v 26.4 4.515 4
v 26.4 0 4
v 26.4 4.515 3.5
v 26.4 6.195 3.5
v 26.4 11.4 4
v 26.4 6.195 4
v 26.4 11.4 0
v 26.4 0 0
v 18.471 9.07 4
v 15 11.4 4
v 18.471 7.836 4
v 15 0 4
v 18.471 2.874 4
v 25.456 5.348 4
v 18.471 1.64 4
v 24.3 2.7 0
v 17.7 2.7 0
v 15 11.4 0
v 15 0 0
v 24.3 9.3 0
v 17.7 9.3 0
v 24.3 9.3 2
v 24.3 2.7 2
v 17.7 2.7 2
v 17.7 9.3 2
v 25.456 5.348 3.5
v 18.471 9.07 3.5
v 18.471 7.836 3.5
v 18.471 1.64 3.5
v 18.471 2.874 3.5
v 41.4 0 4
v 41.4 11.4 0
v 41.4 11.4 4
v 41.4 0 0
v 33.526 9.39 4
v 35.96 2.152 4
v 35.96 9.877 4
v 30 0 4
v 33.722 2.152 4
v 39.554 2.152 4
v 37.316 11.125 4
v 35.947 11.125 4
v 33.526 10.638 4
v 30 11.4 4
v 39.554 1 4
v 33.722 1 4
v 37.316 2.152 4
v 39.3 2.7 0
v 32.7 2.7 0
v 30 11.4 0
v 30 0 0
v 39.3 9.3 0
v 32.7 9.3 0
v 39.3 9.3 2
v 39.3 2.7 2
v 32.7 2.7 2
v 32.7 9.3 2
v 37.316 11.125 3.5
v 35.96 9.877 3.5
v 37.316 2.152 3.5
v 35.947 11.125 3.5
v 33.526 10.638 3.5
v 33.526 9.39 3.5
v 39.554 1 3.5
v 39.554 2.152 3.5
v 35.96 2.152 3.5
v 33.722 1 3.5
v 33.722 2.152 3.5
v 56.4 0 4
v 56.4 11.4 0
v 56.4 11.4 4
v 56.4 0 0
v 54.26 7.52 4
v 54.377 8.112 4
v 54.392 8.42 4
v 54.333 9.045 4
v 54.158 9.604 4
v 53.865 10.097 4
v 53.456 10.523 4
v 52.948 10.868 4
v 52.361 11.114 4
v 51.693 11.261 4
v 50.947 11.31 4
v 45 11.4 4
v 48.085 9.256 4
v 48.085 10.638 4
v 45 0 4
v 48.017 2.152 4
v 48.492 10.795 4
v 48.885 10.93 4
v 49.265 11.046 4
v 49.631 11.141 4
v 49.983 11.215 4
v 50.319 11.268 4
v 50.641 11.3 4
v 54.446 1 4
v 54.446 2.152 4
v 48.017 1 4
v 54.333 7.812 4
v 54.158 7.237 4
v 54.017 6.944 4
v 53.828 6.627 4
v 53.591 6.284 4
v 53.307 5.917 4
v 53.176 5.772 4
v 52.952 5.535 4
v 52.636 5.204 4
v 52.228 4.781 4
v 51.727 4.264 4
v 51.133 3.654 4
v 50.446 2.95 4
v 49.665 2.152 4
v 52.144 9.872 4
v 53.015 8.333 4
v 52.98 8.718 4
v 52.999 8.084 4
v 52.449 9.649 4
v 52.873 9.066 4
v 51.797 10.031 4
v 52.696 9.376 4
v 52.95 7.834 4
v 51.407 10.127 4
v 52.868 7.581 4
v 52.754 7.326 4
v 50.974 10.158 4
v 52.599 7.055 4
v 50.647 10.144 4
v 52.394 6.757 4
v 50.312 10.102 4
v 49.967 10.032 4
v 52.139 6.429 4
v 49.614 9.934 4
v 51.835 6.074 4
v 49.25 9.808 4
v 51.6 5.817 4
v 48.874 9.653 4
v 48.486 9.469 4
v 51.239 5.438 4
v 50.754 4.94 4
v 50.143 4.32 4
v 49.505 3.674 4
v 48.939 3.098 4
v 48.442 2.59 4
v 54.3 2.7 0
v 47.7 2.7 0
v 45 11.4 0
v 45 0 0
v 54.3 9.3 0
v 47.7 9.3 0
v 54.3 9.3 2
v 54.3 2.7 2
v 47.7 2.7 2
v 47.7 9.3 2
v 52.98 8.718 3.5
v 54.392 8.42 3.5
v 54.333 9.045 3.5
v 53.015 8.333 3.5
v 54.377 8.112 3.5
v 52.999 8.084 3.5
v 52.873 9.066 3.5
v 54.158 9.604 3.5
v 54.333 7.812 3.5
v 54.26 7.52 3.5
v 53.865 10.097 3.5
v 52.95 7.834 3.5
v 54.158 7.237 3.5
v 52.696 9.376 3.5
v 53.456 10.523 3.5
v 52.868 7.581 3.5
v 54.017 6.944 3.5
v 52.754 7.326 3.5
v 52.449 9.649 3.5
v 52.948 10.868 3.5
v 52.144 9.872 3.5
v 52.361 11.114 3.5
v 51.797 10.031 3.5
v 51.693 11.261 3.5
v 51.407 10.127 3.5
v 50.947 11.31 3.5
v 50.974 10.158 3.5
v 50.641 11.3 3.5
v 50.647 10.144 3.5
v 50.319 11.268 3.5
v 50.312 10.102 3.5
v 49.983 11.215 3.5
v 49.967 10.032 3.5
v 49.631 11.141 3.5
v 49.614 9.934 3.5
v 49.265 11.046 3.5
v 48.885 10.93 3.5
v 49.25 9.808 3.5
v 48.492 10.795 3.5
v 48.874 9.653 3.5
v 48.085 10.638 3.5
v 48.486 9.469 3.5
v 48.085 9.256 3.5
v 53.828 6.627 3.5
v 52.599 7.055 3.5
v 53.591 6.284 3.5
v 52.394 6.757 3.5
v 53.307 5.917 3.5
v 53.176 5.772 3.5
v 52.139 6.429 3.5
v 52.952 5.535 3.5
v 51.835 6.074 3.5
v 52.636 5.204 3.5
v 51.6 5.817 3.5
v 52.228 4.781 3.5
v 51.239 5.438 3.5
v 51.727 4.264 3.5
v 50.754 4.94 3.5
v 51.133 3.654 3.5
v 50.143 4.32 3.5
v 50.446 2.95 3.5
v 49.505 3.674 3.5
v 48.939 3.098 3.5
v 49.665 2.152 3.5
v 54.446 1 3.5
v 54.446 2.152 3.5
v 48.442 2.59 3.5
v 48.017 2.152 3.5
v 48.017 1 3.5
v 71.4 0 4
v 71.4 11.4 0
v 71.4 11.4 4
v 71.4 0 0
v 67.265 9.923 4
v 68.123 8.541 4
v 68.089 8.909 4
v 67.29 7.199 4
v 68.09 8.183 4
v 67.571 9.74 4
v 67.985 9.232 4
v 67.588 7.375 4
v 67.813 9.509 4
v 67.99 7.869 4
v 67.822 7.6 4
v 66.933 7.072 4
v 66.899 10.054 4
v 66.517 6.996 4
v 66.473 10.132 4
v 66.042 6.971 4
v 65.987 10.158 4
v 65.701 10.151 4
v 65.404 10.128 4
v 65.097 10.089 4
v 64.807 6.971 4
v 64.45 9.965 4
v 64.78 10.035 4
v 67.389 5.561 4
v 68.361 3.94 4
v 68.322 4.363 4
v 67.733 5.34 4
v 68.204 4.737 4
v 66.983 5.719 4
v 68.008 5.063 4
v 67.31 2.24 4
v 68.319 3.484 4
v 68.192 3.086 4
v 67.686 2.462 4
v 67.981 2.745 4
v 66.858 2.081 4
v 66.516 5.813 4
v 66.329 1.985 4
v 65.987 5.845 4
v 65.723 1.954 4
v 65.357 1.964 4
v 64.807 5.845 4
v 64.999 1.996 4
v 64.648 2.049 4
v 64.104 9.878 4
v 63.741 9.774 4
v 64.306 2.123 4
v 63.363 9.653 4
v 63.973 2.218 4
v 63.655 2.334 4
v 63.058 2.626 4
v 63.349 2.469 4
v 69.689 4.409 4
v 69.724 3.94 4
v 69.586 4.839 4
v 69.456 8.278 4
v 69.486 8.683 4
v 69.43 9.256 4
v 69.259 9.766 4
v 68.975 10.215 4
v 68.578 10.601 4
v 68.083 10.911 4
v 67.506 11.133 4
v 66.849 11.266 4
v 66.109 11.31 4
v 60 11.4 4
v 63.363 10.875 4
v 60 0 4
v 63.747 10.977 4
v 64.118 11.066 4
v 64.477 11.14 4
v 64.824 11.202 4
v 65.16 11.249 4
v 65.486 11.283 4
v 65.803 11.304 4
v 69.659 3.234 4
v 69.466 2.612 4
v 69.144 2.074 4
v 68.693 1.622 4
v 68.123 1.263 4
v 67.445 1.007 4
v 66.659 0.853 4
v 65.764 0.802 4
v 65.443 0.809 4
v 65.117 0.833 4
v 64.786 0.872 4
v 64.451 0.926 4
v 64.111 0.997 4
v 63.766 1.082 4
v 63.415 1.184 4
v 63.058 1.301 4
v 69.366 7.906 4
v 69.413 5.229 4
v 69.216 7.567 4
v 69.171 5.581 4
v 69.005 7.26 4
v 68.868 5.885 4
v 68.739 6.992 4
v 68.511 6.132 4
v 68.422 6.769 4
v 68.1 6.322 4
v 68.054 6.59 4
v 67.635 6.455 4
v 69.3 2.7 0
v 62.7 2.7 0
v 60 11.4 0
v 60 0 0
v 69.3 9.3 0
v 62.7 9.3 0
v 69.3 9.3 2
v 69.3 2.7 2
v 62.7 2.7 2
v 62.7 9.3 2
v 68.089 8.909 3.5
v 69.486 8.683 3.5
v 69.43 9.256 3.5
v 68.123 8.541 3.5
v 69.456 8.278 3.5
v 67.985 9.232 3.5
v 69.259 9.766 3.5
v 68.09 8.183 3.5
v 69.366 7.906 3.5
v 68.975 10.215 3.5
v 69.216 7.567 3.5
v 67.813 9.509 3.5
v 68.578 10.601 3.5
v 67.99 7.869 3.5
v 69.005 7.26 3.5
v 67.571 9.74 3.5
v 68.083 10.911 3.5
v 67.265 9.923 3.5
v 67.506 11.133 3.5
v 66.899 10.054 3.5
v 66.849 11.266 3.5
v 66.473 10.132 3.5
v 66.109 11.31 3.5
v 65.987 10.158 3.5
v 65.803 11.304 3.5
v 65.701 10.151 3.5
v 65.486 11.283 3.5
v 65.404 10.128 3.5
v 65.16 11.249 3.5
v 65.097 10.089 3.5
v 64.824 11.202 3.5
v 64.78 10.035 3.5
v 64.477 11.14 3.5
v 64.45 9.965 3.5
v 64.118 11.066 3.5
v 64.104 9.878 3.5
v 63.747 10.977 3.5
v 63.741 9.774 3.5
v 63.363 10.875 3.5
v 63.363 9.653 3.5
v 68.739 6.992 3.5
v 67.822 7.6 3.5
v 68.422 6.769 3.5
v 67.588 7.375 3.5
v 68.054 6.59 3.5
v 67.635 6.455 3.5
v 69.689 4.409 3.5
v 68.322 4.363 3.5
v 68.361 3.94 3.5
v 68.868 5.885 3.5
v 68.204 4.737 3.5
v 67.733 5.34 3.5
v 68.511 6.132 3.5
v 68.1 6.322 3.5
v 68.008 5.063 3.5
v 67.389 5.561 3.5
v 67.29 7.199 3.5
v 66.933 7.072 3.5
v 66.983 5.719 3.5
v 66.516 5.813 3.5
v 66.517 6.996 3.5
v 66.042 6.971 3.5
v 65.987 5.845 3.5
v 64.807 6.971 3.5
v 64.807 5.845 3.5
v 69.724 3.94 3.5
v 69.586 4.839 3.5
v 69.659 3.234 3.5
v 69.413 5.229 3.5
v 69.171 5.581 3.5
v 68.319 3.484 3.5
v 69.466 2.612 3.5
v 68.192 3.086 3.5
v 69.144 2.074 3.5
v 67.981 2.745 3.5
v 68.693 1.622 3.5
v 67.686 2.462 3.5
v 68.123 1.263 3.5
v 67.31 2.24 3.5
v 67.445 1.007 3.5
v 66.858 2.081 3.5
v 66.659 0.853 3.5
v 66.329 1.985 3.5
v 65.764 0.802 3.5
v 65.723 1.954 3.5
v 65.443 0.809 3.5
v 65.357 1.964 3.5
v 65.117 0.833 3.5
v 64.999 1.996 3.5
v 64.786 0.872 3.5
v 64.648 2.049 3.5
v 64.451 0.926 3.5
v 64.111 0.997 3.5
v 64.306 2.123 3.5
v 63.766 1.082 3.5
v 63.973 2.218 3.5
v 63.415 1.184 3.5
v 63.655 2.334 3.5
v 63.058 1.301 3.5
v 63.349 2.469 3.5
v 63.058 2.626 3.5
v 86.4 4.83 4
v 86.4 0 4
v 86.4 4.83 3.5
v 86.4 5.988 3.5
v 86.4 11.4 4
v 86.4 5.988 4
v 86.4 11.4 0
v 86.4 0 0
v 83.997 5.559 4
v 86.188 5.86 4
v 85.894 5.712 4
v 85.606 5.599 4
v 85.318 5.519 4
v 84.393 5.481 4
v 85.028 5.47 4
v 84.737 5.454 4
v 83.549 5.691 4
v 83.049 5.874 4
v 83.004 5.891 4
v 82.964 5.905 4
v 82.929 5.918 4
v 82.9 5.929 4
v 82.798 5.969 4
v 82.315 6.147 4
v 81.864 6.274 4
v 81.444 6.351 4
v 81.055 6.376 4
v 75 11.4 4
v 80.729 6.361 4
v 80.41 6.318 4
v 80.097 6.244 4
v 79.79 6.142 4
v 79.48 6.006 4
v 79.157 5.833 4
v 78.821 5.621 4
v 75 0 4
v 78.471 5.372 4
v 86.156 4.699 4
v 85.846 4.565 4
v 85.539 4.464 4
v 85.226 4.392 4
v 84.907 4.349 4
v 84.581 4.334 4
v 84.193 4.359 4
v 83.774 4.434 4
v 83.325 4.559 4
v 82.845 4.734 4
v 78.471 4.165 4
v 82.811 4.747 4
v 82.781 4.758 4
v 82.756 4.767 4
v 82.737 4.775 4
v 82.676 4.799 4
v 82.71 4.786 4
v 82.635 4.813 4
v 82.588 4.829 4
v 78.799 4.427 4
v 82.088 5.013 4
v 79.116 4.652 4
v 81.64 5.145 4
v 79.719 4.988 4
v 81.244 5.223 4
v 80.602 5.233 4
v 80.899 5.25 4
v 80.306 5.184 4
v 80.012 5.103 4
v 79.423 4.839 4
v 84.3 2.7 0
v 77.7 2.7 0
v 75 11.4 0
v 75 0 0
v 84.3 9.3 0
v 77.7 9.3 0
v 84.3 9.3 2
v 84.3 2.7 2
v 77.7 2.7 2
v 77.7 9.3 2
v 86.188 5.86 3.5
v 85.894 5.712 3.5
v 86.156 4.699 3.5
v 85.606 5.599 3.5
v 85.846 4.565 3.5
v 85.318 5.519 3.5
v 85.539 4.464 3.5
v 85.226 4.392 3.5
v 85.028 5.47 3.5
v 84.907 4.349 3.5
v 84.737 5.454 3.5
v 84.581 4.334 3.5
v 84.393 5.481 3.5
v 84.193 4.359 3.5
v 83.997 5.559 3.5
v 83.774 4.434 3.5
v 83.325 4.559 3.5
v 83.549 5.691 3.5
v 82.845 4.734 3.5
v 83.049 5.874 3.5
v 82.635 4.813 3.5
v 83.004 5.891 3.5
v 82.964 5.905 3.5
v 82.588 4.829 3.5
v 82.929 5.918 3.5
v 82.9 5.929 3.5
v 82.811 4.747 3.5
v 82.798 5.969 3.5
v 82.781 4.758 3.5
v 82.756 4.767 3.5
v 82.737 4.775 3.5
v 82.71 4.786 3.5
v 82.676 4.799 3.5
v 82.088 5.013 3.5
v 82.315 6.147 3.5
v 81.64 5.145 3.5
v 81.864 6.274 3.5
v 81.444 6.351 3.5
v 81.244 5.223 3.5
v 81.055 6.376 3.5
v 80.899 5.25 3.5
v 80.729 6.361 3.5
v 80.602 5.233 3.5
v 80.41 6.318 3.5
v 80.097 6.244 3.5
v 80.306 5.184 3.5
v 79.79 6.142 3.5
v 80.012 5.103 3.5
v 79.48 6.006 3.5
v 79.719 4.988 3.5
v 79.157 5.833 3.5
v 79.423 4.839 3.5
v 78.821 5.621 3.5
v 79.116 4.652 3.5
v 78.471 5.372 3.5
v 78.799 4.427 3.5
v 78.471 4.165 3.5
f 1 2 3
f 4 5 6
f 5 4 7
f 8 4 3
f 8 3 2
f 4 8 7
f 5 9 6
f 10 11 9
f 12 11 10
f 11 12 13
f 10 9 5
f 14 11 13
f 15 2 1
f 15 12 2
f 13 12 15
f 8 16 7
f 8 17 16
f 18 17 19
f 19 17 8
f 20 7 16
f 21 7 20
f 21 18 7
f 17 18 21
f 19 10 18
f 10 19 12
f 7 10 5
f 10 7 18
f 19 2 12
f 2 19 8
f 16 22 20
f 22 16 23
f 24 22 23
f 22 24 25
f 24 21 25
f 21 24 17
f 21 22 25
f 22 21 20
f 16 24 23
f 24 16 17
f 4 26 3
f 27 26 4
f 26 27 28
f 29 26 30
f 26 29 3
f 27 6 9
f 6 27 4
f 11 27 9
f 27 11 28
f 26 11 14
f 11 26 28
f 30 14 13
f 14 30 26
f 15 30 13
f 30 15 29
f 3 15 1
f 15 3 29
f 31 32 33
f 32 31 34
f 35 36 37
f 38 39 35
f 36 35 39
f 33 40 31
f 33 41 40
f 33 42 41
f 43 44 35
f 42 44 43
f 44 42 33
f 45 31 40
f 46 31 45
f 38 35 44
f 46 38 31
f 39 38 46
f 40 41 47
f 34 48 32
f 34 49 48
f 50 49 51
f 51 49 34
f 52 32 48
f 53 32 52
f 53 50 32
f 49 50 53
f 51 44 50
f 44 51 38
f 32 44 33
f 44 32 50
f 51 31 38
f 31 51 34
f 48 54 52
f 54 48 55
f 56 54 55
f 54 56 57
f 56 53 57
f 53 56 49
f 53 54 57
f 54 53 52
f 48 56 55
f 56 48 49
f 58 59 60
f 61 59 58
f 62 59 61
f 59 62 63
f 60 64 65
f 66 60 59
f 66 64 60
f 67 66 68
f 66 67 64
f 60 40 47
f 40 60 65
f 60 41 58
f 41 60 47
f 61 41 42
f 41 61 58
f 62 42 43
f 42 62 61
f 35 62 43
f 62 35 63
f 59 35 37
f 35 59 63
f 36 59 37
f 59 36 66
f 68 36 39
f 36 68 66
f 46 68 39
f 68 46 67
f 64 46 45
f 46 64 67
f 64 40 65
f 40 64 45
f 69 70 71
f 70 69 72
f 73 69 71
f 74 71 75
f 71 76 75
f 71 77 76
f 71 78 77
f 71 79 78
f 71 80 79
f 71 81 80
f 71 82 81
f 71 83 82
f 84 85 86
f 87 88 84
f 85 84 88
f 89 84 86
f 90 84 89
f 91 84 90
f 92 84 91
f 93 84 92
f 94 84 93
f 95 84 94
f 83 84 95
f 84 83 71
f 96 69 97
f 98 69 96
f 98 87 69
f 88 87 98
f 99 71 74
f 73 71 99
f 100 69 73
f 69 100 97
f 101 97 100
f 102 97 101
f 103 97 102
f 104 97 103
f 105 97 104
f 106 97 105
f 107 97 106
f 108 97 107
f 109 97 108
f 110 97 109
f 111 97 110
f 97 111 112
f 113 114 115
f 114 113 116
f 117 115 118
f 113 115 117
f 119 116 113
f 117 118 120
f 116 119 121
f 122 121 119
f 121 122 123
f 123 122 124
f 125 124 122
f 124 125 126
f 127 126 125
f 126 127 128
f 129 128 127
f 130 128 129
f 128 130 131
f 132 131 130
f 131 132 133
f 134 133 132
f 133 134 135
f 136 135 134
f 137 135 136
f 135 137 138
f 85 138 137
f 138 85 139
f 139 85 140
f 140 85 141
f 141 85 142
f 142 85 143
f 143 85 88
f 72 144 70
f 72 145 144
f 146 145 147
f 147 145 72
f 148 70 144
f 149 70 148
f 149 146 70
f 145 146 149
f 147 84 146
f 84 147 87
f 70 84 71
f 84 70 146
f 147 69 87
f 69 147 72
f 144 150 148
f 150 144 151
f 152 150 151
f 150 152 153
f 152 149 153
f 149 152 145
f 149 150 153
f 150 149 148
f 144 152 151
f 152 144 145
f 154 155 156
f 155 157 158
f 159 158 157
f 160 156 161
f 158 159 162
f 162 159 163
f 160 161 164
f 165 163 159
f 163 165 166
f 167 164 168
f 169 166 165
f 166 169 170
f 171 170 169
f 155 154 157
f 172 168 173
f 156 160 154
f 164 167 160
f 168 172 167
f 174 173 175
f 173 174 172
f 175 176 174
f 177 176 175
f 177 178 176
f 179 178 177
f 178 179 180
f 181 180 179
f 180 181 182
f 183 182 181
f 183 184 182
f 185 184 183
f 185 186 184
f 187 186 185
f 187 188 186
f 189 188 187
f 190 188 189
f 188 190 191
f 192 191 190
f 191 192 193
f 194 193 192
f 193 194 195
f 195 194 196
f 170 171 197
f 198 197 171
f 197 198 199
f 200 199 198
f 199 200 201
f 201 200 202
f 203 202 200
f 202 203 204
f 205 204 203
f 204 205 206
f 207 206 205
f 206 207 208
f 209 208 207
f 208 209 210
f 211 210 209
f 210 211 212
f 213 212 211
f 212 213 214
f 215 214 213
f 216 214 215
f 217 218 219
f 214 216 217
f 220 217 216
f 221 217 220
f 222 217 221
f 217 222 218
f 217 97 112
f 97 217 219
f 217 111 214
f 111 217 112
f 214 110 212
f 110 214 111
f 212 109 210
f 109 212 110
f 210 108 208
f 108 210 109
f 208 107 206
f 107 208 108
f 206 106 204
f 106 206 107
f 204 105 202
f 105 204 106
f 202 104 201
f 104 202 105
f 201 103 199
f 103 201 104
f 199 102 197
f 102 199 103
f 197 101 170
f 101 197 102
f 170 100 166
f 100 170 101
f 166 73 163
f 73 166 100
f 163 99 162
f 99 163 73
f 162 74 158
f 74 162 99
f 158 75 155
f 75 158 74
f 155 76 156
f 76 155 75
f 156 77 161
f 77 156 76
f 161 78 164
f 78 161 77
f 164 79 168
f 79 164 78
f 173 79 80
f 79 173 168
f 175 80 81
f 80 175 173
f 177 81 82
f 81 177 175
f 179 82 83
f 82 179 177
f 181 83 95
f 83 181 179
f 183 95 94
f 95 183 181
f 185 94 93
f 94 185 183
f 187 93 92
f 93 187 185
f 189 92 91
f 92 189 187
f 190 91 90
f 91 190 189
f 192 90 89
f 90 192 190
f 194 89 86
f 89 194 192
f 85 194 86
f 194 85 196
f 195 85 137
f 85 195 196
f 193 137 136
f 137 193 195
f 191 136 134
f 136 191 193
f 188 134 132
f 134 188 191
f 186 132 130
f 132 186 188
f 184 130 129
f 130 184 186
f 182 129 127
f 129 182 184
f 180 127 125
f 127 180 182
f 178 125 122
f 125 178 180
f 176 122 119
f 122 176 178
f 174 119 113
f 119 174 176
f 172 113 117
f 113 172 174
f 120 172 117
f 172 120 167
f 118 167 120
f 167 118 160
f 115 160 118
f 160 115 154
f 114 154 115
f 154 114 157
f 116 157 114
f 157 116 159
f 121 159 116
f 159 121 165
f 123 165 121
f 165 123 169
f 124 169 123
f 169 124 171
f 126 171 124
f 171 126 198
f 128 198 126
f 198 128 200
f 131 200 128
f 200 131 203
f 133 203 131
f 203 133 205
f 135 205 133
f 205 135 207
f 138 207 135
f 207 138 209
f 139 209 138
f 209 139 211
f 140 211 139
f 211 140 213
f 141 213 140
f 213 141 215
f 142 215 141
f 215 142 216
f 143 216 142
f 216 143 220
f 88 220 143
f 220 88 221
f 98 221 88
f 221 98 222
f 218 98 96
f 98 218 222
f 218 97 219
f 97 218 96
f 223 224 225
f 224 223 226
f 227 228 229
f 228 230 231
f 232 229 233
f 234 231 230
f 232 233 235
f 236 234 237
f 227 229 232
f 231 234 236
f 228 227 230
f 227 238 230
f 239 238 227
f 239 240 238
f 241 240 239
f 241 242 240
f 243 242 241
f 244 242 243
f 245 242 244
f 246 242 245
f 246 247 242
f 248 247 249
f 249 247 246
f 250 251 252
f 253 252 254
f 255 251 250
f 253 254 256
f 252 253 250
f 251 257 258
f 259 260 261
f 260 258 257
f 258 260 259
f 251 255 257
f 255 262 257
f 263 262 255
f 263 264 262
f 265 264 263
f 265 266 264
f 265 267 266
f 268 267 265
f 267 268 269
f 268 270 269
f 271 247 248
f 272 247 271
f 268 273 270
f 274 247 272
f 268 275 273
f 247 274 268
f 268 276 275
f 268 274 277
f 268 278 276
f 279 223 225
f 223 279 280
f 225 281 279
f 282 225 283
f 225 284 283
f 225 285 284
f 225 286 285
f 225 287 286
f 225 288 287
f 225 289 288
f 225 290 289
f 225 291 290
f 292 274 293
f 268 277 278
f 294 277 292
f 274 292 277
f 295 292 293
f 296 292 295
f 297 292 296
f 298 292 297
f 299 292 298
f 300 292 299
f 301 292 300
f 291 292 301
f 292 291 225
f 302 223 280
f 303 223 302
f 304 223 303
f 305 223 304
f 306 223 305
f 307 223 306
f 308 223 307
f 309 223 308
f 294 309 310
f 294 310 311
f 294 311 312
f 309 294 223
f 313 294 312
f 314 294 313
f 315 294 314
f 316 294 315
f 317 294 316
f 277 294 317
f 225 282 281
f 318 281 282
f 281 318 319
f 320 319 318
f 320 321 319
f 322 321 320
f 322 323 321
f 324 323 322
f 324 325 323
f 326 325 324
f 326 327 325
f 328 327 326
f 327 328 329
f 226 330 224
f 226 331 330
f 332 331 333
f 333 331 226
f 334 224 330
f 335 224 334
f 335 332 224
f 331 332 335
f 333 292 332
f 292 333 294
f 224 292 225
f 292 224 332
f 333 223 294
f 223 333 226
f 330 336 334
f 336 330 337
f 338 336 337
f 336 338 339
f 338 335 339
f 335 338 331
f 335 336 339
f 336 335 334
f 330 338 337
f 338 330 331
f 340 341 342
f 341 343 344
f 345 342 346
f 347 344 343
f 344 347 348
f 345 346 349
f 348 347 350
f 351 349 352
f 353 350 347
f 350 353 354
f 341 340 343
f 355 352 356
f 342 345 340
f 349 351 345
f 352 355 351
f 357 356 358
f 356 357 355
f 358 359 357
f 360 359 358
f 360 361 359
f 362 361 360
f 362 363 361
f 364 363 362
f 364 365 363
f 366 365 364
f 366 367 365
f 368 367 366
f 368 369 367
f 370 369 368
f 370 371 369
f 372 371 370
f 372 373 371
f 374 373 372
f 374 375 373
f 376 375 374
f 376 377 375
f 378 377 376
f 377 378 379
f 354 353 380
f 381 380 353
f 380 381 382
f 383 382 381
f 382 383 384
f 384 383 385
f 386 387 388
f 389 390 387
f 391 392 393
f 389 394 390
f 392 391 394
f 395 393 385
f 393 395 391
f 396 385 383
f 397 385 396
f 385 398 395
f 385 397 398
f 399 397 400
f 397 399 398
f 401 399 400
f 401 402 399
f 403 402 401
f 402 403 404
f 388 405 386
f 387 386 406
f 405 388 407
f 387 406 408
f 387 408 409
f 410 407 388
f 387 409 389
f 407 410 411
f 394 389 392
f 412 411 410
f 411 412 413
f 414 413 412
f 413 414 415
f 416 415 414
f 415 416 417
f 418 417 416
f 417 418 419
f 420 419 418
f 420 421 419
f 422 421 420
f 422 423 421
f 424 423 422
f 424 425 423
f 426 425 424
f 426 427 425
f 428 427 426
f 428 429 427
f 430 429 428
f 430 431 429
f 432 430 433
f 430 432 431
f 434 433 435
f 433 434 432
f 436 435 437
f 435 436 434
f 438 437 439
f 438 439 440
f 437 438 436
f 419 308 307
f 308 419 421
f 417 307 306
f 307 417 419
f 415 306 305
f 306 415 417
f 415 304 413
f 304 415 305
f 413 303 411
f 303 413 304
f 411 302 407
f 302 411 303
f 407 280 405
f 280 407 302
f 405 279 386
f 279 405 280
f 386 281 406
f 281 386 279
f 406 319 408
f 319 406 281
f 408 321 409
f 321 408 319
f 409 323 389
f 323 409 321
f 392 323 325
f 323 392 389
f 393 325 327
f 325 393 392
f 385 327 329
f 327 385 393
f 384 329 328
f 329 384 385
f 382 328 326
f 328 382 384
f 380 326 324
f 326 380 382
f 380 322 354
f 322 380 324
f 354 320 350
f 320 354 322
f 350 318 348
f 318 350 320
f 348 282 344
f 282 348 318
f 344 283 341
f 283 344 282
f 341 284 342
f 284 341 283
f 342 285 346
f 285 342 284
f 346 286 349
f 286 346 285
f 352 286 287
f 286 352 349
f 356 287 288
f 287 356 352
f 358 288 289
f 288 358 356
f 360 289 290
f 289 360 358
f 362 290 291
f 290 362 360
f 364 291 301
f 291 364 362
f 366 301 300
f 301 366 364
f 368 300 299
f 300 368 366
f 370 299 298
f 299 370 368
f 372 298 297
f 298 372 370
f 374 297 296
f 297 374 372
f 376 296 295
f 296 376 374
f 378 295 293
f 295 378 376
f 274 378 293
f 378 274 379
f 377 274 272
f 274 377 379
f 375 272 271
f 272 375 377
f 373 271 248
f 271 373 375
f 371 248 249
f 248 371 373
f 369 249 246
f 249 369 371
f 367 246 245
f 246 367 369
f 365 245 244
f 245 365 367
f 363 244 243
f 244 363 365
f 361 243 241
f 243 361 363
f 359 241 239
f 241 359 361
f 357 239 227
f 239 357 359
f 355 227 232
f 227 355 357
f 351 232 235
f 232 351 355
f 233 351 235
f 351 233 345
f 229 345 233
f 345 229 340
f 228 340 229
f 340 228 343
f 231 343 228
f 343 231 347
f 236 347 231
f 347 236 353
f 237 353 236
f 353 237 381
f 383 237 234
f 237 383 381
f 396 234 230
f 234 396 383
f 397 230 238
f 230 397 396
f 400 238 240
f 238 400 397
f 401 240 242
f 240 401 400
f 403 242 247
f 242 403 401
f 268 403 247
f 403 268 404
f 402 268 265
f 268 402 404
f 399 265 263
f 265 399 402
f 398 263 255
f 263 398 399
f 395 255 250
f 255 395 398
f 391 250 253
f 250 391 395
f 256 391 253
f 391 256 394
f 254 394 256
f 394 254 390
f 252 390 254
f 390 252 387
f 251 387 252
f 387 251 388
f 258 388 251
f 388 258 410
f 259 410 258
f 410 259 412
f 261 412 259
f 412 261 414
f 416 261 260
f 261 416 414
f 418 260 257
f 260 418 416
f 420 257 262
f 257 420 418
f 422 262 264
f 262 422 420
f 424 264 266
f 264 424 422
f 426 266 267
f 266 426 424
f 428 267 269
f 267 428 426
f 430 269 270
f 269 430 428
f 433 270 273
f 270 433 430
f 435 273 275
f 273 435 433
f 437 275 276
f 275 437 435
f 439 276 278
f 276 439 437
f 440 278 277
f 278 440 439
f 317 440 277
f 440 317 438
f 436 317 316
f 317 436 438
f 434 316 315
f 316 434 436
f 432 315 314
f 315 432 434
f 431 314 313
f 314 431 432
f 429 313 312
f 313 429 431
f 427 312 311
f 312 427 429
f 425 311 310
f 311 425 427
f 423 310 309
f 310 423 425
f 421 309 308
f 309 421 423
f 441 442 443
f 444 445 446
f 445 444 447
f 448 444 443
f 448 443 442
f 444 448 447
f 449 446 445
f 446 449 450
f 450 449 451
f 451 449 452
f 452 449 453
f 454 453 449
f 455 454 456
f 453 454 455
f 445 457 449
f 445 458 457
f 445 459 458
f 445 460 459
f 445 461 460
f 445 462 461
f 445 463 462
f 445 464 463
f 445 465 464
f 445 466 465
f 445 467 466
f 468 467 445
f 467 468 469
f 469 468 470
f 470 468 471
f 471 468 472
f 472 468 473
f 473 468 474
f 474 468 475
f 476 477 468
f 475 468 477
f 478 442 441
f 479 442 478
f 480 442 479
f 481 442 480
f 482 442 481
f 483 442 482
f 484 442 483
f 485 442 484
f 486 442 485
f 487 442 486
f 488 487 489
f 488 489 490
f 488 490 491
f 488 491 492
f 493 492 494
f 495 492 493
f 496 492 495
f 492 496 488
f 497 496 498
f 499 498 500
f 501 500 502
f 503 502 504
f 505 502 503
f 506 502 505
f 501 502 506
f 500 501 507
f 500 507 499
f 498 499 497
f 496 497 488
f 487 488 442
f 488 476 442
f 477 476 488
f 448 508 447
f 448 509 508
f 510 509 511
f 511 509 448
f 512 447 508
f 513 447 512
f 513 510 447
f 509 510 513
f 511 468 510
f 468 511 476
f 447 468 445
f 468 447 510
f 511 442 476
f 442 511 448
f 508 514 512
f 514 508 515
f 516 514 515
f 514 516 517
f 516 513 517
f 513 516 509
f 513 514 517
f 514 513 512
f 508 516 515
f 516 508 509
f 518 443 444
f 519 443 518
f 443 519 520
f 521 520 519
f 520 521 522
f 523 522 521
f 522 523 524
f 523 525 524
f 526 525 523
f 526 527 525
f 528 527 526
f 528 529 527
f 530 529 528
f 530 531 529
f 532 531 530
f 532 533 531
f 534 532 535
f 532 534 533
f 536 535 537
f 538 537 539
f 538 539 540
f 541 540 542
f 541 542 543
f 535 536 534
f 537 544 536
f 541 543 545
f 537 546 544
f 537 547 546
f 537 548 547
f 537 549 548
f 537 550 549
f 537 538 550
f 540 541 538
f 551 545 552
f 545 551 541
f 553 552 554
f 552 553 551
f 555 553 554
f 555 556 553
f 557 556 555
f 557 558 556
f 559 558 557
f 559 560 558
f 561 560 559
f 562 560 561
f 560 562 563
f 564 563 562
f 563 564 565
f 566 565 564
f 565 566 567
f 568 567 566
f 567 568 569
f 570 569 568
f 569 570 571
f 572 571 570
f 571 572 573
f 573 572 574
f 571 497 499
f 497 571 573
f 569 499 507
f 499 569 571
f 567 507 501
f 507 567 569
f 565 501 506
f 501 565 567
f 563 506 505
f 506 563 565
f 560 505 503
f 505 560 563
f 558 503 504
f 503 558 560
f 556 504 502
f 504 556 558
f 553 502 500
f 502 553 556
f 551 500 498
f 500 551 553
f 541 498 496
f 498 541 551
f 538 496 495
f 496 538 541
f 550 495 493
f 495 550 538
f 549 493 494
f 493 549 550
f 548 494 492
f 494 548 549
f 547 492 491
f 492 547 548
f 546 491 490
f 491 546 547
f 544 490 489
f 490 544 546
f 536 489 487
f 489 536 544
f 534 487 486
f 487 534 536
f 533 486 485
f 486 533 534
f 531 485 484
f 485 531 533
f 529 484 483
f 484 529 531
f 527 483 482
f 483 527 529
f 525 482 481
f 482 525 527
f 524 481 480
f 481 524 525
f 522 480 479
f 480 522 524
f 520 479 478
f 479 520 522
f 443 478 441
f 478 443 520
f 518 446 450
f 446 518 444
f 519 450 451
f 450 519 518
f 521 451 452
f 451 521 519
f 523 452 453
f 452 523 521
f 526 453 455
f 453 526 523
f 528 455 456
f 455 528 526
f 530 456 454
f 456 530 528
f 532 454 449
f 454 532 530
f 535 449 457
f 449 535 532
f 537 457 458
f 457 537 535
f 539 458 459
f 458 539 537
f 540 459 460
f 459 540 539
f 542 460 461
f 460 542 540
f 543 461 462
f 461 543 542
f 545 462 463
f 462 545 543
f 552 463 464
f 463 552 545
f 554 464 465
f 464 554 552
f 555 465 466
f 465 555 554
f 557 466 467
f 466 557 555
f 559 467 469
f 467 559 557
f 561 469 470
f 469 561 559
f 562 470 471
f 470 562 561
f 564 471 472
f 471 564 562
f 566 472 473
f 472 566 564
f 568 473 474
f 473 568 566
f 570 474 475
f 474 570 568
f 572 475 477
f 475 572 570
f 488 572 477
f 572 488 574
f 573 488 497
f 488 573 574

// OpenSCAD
push_size = 6;
margin = 0.3;

module button(off, txt) {
translate([15*off, 0,0]) 
difference() {
  difference() {
    cube([11.4,11.4,4]);
    translate([(12-(push_size+2*margin))/2,(12-(push_size+2*margin))/2,0]
)   {
        cube([push_size+2*margin,push_size+2*margin,2]);
    }
  }
  translate([2,1,3.5]) {
    linear_extrude(1) text(txt, font="Arial Rounded MT Bold");
  }
}
}

//button(0,"<");
button(1,">");
button(2,"1");
button(3,"2");
button(4,"3");
button(5,"~");
